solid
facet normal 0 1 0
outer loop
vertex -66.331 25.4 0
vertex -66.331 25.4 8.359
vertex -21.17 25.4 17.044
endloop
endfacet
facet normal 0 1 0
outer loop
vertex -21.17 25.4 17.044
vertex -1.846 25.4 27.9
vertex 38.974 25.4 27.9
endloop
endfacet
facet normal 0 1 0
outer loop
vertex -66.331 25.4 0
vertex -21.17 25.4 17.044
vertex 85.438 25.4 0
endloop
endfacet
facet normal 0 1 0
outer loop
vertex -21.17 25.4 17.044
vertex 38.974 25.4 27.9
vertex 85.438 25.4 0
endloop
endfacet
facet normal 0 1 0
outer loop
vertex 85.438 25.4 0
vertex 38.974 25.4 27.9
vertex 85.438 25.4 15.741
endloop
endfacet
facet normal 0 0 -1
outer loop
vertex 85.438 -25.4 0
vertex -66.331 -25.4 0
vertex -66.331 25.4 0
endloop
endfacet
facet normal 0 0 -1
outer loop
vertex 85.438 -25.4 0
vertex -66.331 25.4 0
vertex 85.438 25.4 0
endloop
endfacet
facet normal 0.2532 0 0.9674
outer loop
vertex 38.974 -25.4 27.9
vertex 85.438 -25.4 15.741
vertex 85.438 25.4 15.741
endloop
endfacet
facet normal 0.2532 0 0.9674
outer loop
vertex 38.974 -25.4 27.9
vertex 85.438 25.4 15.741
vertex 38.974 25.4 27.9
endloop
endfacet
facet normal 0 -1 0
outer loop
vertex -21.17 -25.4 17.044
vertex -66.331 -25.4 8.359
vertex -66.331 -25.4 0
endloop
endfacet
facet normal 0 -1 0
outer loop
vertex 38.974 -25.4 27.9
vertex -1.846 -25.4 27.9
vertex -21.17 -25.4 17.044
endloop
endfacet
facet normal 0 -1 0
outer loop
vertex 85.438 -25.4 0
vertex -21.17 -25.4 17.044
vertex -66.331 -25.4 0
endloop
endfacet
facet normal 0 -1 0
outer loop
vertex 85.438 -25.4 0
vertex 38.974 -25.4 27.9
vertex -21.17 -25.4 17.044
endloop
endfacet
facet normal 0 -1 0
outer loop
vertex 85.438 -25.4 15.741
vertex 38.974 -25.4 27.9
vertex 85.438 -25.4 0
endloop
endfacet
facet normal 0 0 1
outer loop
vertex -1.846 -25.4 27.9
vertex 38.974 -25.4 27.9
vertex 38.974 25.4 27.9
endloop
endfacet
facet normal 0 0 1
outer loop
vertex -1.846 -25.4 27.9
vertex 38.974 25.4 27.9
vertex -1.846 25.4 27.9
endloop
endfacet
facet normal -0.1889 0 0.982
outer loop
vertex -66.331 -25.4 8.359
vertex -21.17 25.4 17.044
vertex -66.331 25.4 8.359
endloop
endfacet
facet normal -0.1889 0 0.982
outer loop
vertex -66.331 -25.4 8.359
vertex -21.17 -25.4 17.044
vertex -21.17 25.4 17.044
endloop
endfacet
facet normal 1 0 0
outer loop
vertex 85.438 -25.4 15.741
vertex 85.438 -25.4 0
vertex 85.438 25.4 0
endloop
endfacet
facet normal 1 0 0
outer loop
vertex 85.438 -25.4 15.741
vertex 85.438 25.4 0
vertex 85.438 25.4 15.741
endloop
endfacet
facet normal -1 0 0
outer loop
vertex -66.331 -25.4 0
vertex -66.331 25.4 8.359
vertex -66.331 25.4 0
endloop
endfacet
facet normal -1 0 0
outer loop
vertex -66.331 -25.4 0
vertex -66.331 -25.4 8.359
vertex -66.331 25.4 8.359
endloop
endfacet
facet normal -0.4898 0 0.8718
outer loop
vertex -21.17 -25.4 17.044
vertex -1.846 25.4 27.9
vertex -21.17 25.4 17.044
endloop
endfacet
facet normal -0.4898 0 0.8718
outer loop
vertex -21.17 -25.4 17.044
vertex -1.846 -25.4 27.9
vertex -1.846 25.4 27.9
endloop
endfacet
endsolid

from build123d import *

# Parameters (mm, degrees)
F1_DEPTH      = 25.4
F1_DEPTH_BACK = 25.4


with BuildPart() as f1:
    # F0 (on Front) → F1 (new body, two sides)
    with BuildSketch(Plane.XZ) as f1_sk:
        Polygon((-66.331223, 8.359254), (-66.331223, 0), (85.438088, 0), (85.438088, 15.741451), (38.973667, 27.900366), (-1.845549, 27.900366), (-21.16954, 17.044192), align=None)
    extrude(amount=F1_DEPTH)
    extrude(f1_sk.sketch, amount=-F1_DEPTH_BACK)


solid = f1.part
